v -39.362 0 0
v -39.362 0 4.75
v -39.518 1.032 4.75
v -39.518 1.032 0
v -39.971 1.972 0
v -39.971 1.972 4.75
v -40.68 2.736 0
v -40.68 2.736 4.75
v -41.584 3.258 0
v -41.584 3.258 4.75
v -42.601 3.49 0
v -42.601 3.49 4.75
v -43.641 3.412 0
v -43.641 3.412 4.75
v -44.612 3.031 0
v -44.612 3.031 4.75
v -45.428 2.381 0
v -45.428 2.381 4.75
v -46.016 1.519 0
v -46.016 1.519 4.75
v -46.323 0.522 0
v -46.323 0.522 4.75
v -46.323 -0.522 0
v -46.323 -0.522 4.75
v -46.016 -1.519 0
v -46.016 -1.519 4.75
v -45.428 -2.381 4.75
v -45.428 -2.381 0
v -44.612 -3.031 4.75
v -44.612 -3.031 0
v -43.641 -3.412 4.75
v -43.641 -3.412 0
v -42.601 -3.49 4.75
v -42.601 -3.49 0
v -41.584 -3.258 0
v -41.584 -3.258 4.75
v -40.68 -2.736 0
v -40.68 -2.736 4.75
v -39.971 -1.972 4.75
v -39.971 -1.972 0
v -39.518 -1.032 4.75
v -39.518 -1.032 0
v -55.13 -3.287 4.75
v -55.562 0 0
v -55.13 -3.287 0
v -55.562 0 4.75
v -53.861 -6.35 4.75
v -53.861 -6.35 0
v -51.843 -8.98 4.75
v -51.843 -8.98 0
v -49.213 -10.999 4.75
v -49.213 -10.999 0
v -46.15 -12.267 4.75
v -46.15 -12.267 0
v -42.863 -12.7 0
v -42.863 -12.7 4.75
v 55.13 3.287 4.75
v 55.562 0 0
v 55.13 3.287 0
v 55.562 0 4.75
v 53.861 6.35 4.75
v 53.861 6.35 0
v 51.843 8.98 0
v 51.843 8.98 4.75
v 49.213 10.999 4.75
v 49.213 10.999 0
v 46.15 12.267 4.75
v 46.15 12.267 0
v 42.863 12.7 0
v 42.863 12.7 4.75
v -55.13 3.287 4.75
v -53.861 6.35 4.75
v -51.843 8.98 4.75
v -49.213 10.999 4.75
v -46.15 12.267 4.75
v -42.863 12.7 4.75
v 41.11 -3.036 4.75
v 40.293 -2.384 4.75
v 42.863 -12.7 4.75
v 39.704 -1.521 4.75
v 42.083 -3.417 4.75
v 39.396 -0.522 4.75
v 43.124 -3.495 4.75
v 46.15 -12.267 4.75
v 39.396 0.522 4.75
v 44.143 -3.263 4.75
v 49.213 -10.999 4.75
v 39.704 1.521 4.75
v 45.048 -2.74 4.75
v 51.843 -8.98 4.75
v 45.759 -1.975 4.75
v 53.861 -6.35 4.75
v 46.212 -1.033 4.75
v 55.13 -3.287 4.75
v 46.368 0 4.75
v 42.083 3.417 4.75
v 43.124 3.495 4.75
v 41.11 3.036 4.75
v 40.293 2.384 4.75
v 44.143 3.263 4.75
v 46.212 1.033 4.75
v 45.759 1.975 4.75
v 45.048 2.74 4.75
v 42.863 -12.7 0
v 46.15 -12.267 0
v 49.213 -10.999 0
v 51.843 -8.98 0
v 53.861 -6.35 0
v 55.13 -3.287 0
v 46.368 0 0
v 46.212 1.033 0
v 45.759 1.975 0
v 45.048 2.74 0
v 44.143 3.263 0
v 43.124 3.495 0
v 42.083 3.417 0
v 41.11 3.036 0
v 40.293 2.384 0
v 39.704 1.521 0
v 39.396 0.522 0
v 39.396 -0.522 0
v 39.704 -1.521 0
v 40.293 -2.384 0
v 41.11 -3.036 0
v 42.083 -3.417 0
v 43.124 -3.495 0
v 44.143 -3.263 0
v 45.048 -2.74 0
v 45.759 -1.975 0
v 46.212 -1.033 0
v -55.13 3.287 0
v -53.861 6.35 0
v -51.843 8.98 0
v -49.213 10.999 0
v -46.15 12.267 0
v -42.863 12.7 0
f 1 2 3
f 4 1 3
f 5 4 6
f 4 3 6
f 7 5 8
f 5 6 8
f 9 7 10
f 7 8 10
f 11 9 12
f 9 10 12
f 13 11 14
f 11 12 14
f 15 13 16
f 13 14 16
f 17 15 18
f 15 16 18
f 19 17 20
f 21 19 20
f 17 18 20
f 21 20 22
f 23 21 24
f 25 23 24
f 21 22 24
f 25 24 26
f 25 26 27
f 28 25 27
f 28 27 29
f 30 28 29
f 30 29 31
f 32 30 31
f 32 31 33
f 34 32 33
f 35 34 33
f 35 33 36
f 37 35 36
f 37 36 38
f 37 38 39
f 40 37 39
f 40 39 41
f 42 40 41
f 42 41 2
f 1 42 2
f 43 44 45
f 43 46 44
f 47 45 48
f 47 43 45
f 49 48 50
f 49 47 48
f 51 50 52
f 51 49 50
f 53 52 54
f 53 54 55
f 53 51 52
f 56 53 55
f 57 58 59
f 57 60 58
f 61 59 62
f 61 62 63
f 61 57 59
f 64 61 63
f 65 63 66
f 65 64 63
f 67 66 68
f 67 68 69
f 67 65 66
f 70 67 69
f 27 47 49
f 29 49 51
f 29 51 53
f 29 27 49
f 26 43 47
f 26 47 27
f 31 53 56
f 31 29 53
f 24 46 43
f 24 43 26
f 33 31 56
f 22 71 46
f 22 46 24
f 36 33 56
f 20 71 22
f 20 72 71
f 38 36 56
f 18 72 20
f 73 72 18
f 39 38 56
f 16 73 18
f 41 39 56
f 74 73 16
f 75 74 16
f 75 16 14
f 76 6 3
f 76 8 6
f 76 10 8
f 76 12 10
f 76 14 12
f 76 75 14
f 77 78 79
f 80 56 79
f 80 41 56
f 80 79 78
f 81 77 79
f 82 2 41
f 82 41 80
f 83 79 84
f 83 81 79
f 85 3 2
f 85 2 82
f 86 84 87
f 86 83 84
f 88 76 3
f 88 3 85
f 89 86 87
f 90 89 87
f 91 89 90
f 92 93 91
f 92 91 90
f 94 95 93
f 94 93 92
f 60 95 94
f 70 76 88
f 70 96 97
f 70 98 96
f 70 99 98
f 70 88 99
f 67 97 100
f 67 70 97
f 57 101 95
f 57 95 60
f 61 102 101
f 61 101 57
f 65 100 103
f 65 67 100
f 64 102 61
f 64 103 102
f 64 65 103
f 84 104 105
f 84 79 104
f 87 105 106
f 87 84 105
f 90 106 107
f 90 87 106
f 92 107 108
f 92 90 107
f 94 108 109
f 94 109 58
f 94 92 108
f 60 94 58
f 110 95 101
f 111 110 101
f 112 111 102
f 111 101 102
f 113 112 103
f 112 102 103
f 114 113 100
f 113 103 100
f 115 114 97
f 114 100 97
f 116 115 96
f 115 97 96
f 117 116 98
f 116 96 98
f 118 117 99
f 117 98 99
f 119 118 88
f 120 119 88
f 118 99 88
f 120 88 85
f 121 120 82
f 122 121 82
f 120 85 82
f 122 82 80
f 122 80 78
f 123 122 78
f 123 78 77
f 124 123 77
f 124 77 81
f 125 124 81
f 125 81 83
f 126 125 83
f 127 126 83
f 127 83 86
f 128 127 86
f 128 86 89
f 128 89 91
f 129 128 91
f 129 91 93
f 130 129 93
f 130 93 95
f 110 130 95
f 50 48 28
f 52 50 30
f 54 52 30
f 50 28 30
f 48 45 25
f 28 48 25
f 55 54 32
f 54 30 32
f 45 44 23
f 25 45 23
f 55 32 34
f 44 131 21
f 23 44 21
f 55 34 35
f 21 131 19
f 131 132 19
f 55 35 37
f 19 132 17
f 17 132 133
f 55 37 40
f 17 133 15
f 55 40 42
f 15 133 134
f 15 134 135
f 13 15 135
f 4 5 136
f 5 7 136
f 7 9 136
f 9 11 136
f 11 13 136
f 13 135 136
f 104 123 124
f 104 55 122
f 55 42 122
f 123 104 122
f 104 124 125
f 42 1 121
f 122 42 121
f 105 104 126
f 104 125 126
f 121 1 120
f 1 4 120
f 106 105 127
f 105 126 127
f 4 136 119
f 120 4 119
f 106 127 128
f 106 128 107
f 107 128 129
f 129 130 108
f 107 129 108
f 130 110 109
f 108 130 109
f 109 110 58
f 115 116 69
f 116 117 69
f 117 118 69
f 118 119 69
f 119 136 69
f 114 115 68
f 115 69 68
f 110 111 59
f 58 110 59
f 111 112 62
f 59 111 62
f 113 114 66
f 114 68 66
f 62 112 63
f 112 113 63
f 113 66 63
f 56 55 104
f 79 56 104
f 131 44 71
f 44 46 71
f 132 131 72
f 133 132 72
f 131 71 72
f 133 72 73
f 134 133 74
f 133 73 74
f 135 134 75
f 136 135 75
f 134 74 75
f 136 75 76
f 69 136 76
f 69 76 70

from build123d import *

# Parameters (mm, degrees)
F0_W     = 111.125
F0_H     = 25.4
F1_DEPTH = 4.7498
F2_R     = 12.69999
F3_R     = 3.5
F3_R_2   = 3.5052
F4_DEPTH = 25.4


# Not quite as in the source:
# - a fillet or chamfer is up to 0.001 mm smaller than in the source, because OpenCascade refuses the exact size


with BuildPart() as f1:
    # F0 (on Top) → F1 (new body)
    with BuildSketch(Plane.XY):
        Rectangle(F0_W, F0_H)
    extrude(amount=F1_DEPTH)

    # F2 (radius 12.7 in the source; OpenCascade refuses exactly that, so slightly less here)
    f2_edges = [f1.edges().sort_by_distance(p)[0] for p in [
        (-55.5625, -12.7, 2.3749),
        (-55.5625, 12.7, 2.3749),
        (55.5625, -12.7, 2.3749),
        (55.5625, 12.7, 2.3749),
    ]]
    fillet(f2_edges, radius=F2_R)

    # F3 (on face) → F4 (cut)
    with BuildSketch(Plane.XY.offset(4.7498)):
        with Locations((-42.8625, 0)):
            Circle(F3_R)
        with Locations((42.8625, 0)):
            Circle(F3_R_2)
    extrude(amount=-F4_DEPTH, mode=Mode.SUBTRACT)


solid = f1.part
